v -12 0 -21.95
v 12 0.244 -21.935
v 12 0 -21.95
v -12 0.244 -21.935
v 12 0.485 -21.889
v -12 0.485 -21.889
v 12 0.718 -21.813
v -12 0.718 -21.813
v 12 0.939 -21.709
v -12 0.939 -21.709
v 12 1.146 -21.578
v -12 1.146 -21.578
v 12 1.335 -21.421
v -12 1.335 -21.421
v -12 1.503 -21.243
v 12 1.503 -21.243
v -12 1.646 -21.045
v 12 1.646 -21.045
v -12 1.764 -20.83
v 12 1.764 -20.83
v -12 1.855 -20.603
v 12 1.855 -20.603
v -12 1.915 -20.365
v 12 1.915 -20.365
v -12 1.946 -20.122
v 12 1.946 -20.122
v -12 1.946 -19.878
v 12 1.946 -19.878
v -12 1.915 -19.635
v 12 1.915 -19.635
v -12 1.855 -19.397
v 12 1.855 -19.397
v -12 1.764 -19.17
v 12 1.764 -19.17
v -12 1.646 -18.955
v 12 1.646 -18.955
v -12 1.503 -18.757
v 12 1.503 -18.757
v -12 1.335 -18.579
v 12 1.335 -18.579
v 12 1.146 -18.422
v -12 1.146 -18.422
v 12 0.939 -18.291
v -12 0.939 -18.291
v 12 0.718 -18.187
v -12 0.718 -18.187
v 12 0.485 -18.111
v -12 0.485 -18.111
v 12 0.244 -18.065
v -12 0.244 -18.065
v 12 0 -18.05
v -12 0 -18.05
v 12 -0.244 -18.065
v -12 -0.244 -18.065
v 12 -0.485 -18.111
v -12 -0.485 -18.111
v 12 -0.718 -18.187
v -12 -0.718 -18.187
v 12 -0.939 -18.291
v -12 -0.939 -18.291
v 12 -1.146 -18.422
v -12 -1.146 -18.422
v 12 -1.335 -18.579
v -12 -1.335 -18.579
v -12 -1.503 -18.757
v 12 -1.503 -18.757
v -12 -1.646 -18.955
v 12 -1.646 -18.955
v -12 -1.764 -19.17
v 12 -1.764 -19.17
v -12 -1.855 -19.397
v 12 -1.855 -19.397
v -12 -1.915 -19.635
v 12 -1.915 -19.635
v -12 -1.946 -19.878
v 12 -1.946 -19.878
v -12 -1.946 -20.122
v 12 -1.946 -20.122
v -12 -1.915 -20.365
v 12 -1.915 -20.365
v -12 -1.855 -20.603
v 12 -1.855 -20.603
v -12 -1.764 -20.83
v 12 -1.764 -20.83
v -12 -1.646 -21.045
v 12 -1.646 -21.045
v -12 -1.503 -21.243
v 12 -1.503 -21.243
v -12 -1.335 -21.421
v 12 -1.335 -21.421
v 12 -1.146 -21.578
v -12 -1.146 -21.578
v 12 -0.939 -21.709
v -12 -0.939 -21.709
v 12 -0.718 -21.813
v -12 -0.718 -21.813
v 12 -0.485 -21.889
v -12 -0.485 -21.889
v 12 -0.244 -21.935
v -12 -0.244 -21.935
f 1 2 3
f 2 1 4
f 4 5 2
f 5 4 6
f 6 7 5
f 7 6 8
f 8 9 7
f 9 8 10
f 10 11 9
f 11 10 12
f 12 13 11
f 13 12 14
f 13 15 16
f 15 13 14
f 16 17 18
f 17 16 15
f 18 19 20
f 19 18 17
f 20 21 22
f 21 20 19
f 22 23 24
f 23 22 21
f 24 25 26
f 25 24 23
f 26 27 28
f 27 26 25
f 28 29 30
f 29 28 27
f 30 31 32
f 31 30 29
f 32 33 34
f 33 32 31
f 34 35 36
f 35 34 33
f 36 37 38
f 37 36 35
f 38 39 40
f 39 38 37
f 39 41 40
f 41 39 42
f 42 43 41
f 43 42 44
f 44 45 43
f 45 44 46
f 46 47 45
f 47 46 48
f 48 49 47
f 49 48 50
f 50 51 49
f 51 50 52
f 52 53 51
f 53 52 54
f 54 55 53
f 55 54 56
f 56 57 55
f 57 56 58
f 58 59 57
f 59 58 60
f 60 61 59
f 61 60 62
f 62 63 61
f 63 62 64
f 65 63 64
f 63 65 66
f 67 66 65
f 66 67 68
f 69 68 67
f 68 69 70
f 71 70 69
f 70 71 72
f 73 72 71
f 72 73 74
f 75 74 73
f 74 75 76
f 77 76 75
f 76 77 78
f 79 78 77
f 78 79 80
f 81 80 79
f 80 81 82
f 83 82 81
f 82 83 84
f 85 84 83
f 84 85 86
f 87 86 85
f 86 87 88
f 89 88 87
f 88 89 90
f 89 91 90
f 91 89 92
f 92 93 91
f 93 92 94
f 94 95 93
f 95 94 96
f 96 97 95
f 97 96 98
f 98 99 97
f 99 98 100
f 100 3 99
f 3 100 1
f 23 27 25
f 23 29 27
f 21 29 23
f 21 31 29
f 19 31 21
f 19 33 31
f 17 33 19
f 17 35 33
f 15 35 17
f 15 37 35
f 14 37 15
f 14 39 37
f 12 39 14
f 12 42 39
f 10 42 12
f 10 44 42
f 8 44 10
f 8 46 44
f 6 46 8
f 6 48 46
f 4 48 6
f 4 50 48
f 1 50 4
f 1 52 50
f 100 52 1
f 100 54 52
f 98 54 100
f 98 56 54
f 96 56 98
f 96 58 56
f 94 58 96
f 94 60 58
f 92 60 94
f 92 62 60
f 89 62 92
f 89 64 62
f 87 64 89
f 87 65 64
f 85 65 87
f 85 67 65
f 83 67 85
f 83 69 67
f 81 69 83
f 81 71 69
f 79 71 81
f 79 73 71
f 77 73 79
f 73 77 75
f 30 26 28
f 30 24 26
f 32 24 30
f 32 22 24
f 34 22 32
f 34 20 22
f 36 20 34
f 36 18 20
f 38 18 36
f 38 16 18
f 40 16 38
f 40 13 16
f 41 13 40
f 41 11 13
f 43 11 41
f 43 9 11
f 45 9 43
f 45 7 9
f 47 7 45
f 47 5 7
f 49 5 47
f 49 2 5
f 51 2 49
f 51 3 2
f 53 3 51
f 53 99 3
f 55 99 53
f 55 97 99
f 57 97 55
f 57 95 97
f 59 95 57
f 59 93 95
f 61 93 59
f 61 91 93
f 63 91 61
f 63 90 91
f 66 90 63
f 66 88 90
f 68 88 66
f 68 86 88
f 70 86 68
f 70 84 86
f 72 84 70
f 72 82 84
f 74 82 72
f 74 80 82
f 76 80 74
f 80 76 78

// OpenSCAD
include <../robot_settings.scad>

use <../Front_End/robot_rail.scad>
use <../Front_End/tire_apparatus.scad>
use <../Front_End/tire_rim.scad>
use <../Front_End/dc_motor_mount.scad>
use <../Front_End/axle_for_custom_hub.scad>
use <../Front_End/MCAD/involute_gears.scad>
use <../Front_End/OpenSCAD_Gear_Library_with_Customizer/files/gears.scad>
use <../Front_End/Battery_box_2.scad>
use <dc_motor.scad>
use <../spring_library.scad>

use <rear_apparatus.scad>
use <../apparatus_pegs.scad>
use <power_bar.scad>
use <drv8871.scad>
use <drv8871mount.scad>
$fn = 50;


translate([0, 0, 0])
rotate([0, 90, 0])
apparatus_peg();

//axle(axle_length = 30, rear_axle = true);
